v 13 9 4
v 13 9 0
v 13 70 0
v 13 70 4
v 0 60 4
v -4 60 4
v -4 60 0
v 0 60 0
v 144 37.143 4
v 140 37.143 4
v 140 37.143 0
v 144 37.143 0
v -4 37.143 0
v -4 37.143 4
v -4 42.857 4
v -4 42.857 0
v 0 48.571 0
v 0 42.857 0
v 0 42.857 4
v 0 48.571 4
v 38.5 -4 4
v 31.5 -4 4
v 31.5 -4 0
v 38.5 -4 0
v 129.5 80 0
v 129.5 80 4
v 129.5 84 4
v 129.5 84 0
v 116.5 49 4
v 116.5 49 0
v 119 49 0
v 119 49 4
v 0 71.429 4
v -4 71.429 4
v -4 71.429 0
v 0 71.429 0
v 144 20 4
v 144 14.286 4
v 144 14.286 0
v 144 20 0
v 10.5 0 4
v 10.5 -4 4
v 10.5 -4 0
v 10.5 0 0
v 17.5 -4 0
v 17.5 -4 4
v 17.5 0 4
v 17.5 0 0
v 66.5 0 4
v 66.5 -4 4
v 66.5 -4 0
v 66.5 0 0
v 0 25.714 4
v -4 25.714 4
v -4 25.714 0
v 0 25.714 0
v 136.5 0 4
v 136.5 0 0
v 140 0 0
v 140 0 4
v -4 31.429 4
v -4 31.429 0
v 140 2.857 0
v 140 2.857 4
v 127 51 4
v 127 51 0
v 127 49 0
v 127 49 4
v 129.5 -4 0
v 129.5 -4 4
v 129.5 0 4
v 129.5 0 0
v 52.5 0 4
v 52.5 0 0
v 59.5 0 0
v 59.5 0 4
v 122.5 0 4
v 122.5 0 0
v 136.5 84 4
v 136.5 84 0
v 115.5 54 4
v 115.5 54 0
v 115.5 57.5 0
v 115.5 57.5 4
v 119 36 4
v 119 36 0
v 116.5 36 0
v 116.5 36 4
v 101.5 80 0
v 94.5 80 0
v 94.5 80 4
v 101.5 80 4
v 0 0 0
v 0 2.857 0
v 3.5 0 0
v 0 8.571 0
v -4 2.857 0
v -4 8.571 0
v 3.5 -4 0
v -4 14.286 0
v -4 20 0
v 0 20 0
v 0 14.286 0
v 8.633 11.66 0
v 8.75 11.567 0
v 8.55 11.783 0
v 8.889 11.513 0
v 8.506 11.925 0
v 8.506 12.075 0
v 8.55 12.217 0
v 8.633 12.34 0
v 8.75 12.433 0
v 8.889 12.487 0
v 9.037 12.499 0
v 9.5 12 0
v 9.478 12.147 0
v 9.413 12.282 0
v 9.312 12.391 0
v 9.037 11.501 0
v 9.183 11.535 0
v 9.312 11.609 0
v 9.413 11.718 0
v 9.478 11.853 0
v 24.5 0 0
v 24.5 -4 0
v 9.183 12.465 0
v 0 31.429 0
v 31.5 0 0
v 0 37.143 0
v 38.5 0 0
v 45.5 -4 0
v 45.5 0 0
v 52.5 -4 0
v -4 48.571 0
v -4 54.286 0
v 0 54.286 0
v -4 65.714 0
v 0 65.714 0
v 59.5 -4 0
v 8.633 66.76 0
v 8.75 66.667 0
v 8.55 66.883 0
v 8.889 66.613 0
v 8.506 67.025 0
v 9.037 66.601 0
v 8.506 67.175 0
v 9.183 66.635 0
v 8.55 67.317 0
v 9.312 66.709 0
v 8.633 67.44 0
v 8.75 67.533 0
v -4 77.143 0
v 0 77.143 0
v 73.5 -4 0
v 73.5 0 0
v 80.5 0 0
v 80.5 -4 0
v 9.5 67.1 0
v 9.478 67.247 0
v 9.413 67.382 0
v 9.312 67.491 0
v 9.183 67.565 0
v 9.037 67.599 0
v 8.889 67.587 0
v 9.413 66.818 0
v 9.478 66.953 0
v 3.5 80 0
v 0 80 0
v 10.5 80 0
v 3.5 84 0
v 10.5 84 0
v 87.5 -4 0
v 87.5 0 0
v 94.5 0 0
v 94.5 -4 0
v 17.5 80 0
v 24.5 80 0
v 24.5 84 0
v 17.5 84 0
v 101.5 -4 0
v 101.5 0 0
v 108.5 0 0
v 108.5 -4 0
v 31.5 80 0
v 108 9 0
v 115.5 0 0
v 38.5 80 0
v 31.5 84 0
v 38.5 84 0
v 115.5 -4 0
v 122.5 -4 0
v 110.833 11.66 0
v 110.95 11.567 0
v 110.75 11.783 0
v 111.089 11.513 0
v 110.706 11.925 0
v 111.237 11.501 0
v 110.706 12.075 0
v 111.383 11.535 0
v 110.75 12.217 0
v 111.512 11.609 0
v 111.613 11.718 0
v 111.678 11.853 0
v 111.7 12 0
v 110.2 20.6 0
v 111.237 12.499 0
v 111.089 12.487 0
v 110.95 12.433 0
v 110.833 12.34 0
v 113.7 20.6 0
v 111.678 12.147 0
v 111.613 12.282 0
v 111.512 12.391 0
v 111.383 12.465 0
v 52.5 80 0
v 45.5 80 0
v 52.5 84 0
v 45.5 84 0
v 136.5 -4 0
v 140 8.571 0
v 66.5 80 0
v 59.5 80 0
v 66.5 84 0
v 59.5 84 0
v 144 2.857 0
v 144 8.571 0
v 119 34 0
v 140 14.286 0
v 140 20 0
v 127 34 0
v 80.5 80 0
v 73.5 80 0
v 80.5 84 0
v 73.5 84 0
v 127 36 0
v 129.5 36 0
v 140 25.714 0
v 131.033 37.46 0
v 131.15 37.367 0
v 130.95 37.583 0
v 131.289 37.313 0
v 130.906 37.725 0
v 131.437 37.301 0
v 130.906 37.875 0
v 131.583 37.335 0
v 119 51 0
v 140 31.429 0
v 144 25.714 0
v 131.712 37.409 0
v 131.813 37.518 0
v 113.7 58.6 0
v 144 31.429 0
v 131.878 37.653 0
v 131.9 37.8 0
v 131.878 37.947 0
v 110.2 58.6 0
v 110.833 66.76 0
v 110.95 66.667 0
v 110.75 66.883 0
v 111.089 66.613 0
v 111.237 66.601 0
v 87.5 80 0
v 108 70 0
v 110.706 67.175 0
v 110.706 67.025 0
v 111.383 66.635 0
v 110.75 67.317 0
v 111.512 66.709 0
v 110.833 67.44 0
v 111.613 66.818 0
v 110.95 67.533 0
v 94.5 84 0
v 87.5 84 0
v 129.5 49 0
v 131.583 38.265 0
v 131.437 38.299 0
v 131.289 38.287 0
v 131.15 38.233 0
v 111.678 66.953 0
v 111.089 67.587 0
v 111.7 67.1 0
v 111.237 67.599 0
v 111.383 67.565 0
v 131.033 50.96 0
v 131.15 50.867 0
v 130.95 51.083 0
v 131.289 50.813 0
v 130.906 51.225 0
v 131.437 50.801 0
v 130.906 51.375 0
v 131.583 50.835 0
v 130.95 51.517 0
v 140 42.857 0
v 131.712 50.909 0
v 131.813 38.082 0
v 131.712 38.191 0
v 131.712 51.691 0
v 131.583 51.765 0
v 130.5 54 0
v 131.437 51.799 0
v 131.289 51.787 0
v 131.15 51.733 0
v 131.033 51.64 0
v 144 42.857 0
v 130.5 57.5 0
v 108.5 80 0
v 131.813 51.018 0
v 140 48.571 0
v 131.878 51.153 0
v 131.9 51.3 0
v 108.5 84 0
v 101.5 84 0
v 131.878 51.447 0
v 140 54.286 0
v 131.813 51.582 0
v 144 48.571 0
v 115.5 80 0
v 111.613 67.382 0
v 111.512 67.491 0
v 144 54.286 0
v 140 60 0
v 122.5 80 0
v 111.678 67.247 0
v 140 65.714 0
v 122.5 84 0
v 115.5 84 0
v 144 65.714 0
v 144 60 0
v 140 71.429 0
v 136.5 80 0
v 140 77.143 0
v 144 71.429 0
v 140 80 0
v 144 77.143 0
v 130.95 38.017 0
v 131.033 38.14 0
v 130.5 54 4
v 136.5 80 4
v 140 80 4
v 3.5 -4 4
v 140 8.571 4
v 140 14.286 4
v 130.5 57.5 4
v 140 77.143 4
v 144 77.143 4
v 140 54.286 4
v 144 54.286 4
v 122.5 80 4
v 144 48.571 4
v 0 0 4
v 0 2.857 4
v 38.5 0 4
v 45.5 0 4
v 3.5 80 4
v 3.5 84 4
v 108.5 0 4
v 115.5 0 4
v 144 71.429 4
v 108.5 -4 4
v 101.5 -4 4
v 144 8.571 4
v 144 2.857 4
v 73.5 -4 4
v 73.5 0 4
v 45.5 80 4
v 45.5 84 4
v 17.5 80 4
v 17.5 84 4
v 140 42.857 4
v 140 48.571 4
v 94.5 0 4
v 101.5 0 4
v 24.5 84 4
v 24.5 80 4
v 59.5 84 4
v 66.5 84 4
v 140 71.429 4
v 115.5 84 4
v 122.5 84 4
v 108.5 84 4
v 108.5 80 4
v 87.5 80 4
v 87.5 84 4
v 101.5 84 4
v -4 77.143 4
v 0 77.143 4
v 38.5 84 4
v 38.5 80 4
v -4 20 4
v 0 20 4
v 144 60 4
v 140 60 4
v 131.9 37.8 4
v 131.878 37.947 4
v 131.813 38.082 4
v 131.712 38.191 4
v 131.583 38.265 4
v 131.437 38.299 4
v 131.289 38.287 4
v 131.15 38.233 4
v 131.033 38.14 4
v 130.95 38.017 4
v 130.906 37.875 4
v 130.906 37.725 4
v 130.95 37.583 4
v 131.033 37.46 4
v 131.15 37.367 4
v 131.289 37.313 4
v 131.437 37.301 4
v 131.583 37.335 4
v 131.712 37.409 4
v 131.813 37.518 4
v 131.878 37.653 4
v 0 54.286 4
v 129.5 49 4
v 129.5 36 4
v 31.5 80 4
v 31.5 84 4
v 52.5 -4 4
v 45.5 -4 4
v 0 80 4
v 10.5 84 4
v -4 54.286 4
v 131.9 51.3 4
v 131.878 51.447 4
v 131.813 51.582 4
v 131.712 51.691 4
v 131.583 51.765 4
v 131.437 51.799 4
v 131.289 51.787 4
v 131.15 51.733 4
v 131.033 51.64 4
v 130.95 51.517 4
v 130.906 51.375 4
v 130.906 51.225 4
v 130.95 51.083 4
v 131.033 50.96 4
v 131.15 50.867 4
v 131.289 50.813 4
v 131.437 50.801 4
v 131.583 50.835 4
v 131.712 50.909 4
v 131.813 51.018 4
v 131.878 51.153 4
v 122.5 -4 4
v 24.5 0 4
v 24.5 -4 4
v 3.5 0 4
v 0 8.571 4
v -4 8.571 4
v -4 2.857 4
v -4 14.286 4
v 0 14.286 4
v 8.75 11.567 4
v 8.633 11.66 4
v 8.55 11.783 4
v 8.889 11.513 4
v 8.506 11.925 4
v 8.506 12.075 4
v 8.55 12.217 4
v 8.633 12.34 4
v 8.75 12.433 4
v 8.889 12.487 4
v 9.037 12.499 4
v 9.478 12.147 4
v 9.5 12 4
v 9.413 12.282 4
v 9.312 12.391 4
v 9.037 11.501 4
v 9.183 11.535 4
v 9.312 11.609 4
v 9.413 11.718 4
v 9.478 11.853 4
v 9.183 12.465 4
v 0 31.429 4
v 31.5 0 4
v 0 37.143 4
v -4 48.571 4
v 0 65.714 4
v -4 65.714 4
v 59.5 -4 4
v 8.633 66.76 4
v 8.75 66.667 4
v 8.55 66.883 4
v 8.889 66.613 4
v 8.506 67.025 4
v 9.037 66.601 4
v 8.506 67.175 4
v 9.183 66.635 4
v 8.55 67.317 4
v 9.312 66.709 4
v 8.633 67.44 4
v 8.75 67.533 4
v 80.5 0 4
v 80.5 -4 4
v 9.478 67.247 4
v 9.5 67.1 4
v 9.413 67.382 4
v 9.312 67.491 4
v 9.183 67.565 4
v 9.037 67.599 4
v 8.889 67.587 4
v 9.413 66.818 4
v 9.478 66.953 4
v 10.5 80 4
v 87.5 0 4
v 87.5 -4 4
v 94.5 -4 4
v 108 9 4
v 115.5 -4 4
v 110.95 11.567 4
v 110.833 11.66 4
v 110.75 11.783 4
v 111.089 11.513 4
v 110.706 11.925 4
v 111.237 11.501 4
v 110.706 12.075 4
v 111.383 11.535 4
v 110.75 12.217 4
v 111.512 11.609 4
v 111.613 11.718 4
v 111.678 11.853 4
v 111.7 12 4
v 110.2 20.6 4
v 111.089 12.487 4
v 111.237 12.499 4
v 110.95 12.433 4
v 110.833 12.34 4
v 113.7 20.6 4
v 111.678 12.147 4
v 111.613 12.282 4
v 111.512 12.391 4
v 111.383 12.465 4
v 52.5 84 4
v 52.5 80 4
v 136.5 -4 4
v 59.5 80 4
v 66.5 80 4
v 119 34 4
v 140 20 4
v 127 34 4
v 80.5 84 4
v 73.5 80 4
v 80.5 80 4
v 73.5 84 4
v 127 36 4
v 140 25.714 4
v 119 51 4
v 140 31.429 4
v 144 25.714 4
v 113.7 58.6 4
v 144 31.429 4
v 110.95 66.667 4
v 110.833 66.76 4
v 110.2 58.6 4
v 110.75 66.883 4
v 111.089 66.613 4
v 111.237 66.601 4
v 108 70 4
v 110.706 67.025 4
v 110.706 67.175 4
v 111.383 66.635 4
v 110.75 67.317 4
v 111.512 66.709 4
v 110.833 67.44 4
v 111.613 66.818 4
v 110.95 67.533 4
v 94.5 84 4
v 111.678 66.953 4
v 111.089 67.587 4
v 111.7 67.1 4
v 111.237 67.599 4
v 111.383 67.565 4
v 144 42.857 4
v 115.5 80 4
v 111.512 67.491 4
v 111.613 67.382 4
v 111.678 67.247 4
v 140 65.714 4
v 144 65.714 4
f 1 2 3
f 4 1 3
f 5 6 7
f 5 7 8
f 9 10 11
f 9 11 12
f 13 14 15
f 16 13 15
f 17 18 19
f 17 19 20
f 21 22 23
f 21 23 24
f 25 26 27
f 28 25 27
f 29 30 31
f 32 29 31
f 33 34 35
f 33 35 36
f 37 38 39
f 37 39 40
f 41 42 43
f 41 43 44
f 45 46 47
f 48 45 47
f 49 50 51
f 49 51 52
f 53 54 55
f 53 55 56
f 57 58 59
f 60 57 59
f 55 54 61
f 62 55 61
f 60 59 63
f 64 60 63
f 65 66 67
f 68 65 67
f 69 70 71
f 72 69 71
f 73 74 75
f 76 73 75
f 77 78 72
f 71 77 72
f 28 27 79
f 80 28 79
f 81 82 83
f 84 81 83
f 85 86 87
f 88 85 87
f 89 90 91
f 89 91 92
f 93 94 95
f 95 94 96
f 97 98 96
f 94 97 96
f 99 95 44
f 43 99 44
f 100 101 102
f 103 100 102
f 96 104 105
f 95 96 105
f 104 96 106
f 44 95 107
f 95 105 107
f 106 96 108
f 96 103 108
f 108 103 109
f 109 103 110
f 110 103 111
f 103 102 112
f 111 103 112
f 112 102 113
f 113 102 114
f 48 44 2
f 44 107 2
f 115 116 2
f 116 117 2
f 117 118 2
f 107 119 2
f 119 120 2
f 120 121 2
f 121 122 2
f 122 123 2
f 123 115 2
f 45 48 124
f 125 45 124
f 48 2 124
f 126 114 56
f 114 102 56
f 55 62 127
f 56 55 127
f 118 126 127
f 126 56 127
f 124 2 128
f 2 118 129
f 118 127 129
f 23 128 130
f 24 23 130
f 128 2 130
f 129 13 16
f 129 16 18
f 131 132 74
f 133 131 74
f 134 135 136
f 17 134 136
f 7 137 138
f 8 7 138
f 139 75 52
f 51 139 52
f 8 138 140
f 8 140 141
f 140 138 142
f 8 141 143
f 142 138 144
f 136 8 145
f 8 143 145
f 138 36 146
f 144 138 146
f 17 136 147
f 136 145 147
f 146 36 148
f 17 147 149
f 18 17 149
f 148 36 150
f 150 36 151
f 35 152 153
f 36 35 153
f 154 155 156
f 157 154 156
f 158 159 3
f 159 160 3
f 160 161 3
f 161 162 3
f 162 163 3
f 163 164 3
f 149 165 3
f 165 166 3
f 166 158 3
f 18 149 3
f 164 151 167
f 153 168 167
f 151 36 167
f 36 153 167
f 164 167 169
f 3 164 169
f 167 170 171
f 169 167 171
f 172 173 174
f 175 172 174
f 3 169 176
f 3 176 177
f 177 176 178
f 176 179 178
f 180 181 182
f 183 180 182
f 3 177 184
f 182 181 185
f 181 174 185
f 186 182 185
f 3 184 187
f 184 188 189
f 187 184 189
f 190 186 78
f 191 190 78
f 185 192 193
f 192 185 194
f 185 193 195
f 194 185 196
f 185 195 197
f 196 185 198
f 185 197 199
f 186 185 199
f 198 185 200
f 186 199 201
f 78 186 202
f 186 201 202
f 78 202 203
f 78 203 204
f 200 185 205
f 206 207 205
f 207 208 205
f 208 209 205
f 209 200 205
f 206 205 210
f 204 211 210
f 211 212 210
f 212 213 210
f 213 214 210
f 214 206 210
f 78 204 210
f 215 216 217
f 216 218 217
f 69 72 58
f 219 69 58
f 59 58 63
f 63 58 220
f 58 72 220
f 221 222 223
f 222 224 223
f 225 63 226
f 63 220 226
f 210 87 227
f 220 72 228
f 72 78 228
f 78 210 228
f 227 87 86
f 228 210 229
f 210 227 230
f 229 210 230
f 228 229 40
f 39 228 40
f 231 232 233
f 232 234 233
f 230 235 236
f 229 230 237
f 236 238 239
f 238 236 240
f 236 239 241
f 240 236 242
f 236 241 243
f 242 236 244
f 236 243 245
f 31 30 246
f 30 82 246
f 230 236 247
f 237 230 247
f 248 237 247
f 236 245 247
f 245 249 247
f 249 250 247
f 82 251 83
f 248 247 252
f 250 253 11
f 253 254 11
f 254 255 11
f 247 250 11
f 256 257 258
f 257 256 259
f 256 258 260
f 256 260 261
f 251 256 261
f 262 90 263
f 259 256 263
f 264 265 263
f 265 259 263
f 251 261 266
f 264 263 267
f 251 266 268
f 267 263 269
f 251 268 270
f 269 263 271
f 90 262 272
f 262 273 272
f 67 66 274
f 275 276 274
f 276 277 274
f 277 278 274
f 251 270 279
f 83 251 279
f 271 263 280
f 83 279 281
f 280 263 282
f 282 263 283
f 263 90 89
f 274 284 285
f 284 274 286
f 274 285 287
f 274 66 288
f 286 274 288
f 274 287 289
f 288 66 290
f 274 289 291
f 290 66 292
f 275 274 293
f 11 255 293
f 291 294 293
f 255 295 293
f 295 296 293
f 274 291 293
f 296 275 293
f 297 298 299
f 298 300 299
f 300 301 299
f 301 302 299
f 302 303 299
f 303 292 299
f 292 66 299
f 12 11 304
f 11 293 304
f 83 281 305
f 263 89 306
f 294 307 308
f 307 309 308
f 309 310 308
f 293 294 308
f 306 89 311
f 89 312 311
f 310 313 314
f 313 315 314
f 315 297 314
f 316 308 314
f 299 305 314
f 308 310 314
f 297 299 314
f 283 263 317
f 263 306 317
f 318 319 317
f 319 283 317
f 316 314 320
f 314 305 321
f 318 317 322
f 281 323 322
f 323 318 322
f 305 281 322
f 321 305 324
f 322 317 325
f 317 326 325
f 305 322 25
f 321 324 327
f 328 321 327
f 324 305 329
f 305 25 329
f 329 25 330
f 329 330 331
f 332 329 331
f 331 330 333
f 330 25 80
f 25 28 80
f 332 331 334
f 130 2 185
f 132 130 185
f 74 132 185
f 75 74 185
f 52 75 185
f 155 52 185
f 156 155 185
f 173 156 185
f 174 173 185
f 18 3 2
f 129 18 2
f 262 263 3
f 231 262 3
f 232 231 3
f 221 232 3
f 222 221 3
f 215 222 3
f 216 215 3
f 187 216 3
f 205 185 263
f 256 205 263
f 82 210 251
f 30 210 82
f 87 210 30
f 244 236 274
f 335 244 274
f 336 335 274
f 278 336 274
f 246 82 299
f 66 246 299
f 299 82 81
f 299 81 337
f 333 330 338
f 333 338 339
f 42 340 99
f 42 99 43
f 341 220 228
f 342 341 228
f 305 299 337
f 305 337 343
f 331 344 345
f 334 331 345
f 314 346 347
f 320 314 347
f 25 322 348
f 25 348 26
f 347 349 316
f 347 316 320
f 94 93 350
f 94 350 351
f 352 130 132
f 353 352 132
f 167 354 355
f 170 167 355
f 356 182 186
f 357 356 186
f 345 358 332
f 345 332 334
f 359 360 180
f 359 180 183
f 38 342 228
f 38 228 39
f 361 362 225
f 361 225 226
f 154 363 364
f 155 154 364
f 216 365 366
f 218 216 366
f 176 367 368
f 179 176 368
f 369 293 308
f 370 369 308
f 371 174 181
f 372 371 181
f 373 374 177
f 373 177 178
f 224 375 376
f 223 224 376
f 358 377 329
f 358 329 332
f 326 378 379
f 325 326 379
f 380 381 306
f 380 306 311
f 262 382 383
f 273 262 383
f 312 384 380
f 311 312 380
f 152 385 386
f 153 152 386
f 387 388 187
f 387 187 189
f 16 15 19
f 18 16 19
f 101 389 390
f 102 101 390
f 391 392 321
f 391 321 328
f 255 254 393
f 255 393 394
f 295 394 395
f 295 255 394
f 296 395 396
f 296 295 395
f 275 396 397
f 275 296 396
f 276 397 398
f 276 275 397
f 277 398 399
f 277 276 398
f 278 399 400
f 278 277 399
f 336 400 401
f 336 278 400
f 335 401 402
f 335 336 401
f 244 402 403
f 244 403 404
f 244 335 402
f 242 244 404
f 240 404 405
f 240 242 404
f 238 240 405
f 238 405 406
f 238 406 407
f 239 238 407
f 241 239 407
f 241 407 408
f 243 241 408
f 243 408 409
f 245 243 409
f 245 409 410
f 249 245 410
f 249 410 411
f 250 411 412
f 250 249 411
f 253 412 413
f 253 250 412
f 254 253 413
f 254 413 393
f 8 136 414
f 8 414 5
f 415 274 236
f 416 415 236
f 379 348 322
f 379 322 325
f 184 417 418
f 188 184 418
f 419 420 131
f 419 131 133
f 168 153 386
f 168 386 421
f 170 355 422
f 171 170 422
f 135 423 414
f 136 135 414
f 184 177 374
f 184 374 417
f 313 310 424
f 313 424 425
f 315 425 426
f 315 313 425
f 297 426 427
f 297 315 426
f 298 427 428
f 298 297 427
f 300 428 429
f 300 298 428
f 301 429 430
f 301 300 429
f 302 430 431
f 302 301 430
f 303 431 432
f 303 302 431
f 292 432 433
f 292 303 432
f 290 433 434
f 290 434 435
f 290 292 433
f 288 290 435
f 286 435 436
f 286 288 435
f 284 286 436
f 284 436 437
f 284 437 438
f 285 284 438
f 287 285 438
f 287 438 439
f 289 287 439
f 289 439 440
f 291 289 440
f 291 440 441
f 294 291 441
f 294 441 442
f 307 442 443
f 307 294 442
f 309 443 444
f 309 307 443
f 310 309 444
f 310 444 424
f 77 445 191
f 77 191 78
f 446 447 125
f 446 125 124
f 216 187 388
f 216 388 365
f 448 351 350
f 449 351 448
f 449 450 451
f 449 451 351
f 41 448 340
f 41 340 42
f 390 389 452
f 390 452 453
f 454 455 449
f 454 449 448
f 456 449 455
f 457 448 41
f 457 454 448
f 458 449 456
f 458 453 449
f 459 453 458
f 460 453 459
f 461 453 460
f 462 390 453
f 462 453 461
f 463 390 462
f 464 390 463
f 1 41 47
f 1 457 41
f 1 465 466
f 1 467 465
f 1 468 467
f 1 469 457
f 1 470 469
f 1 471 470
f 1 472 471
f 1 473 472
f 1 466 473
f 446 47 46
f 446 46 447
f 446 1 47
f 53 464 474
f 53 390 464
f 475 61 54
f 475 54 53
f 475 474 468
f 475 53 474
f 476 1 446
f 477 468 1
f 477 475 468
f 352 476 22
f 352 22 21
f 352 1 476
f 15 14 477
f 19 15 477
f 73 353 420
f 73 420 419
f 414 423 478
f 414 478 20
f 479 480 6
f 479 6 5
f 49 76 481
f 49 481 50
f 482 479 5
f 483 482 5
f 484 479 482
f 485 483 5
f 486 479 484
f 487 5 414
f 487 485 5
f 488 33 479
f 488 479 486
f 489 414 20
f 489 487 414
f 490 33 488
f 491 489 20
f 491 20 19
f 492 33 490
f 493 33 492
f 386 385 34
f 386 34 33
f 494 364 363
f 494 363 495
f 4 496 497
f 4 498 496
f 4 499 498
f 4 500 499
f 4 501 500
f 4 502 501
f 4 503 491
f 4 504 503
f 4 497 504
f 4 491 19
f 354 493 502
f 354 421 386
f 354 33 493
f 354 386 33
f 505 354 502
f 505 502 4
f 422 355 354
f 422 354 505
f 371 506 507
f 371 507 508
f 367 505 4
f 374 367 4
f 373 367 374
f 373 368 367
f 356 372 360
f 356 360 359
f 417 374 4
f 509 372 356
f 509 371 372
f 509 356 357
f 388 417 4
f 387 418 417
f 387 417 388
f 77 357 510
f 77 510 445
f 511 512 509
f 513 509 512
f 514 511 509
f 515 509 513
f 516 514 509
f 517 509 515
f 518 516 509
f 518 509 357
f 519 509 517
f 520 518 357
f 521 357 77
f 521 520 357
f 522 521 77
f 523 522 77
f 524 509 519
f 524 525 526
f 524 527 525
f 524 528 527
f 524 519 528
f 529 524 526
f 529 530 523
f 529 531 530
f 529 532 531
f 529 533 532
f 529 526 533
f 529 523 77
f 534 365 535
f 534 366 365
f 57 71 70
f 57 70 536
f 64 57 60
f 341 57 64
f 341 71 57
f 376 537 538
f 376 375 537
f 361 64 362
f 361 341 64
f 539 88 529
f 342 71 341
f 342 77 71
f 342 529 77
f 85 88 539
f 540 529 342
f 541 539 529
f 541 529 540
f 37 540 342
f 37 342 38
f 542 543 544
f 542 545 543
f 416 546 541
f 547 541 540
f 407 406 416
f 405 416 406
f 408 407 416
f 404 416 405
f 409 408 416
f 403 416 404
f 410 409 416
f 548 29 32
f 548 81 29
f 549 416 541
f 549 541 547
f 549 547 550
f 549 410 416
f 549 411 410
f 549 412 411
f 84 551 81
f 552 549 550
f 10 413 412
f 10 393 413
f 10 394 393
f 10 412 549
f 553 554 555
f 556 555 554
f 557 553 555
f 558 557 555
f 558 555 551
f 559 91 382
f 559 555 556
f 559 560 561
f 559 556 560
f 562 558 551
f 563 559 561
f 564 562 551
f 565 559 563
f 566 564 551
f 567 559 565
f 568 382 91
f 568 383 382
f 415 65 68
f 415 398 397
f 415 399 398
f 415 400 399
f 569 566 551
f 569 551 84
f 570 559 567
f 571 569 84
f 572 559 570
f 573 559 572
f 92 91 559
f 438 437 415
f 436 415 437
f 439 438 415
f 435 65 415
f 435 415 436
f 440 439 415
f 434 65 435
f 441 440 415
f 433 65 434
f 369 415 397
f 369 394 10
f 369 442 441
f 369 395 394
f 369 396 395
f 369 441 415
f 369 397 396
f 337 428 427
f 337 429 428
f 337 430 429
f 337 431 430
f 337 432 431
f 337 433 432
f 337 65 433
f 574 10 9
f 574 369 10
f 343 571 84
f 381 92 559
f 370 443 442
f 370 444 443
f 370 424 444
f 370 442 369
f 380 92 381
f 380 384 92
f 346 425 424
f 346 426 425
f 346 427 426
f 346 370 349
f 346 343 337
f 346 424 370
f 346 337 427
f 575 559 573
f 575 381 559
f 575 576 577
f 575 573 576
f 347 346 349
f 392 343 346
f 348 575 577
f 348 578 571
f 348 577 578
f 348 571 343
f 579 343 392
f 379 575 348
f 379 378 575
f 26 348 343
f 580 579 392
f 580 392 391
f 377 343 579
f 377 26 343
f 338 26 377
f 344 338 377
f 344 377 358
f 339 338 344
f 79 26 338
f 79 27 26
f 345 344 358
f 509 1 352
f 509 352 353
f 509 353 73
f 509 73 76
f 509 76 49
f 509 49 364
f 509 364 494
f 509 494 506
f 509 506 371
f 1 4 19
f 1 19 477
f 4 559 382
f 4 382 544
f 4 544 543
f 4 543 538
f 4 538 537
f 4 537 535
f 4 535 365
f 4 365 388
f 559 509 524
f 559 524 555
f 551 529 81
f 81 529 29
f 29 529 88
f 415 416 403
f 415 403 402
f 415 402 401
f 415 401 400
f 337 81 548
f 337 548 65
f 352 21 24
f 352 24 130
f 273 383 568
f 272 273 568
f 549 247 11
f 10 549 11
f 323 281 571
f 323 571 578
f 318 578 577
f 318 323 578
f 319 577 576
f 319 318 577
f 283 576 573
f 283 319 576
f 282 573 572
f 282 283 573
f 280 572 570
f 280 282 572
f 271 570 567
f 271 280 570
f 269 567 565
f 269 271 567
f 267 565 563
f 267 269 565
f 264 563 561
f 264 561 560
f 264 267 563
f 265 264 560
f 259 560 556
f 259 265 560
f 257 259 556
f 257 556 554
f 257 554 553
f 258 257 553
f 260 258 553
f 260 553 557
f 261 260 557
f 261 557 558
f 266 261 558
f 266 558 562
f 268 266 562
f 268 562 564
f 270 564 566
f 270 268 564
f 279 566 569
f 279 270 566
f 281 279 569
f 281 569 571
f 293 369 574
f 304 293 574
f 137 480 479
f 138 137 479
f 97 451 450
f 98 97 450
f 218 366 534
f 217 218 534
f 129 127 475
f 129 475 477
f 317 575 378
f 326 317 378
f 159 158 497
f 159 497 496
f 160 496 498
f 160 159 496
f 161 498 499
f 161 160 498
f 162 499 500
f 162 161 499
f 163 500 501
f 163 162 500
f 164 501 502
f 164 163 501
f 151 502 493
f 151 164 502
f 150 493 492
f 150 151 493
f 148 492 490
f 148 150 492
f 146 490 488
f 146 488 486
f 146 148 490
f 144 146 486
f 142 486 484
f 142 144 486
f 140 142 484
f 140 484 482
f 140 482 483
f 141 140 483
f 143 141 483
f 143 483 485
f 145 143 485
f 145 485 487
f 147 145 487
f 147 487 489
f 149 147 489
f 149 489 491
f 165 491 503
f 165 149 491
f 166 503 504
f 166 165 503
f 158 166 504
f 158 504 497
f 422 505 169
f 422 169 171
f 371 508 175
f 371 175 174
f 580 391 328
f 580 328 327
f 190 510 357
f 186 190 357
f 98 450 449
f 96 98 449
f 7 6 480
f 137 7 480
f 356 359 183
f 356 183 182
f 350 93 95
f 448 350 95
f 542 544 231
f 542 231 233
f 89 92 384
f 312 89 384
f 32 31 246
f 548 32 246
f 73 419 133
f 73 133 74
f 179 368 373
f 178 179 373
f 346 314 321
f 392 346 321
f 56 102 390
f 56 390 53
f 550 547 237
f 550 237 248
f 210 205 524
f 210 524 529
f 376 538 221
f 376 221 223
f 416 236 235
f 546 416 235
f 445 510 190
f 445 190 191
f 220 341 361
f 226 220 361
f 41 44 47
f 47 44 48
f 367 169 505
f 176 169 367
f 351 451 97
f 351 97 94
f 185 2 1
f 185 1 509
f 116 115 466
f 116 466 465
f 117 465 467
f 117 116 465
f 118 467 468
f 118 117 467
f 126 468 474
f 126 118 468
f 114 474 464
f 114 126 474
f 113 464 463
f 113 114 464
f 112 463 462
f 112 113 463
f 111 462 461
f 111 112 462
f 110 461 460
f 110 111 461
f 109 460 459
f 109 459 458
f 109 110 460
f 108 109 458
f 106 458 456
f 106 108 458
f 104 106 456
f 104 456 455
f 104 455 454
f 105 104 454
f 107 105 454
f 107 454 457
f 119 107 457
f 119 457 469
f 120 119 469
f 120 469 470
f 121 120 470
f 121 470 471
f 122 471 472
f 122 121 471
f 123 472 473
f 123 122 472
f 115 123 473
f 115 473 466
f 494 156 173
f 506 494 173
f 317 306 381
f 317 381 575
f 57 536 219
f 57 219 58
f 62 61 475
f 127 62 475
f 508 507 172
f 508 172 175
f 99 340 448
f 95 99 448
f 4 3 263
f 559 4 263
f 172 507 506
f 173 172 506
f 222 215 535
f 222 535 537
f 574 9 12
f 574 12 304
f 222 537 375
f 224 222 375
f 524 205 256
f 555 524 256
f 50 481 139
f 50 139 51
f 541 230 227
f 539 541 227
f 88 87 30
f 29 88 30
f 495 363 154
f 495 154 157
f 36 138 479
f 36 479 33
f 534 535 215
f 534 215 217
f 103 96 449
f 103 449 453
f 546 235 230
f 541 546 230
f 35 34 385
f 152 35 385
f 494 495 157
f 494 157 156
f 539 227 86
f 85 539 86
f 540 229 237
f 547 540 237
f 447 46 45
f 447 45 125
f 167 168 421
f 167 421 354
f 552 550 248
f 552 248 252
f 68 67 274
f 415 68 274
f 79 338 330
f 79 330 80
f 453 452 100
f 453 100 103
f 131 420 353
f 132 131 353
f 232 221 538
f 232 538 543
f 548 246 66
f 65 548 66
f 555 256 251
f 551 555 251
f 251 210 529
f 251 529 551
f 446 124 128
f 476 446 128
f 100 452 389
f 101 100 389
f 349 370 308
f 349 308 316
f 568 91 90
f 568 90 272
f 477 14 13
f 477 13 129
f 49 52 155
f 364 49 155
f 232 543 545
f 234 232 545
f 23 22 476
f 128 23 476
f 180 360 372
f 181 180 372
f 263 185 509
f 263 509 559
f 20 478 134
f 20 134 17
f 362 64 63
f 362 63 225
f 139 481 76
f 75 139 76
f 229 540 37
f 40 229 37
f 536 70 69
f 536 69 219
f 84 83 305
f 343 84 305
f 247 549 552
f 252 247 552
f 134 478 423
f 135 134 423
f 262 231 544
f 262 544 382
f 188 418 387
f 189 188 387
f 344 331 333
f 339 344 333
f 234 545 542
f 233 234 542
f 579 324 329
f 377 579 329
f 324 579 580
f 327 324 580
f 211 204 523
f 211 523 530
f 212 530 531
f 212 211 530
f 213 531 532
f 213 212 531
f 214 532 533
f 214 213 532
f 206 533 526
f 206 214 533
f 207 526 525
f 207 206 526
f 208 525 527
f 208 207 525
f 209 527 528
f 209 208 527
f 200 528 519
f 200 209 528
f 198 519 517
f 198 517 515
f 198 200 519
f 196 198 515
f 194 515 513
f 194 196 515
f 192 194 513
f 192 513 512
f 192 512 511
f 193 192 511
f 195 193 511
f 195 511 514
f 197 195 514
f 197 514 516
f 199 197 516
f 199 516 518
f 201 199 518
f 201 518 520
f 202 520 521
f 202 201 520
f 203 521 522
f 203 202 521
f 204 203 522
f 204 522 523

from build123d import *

# Parameters (mm, degrees)
SCHIZZO1_W                   = 140
SCHIZZO1_H                   = 80
SCHIZZO1_R                   = 0.5
SCHIZZO1_W_2                 = 95
SCHIZZO1_H_2                 = 61
SCHIZZO1_W_3                 = 3.5
SCHIZZO1_H_3                 = 38
SCHIZZO1_W_4                 = 15
SCHIZZO1_H_4                 = 3.5
ESTRUSIONE_ESTRUSIONE1_DEPTH = 4
SCHIZZO2_W                   = 7
SCHIZZO2_H                   = 4
ESTRUSIONE_ESTRUSIONE2_DEPTH = 4
RIPETIZIONE_A_L1_COUNT       = 10
RIPETIZIONE_A_L1_PITCH       = 14
SCHIZZO3_W                   = 4
SCHIZZO3_H                   = 5.714285714
ESTRUSIONE_ESTRUSIONE3_DEPTH = 4
RIPETIZIONE_A_L2_COUNT       = 7
RIPETIZIONE_A_L2_PITCH       = 11.428571429


with BuildPart() as part:
    # Schizzo1 → Estrusione-Estrusione1 (new body)
    with BuildSketch(Plane.XY):
        with Locations((70, 40)):
            Rectangle(SCHIZZO1_W, SCHIZZO1_H)
        with Locations((9, 12)):
            Circle(SCHIZZO1_R, mode=Mode.SUBTRACT)
        with Locations((60.5, 39.5)):
            Rectangle(SCHIZZO1_W_2, SCHIZZO1_H_2, mode=Mode.SUBTRACT)
        with Locations((111.2, 12)):
            Circle(SCHIZZO1_R, mode=Mode.SUBTRACT)
        with Locations((111.95, 39.6)):
            Rectangle(SCHIZZO1_W_3, SCHIZZO1_H_3, mode=Mode.SUBTRACT)
        with Locations((131.4, 37.8)):
            Circle(SCHIZZO1_R, mode=Mode.SUBTRACT)
        with Locations((9, 67.1)):
            Circle(SCHIZZO1_R, mode=Mode.SUBTRACT)
        Polygon((119, 36), (116.5, 36), (116.5, 49), (119, 49), (119, 51), (127, 51), (127, 49), (129.5, 49), (129.5, 36), (127, 36), (127, 34), (119, 34), align=None, mode=Mode.SUBTRACT)
        with Locations((131.4, 51.3)):
            Circle(SCHIZZO1_R, mode=Mode.SUBTRACT)
        with Locations((123, 55.75)):
            Rectangle(SCHIZZO1_W_4, SCHIZZO1_H_4, mode=Mode.SUBTRACT)
        with Locations((111.2, 67.1)):
            Circle(SCHIZZO1_R, mode=Mode.SUBTRACT)
    extrude(amount=ESTRUSIONE_ESTRUSIONE1_DEPTH)

    # Schizzo2 → Estrusione-Estrusione2 (add)
    with BuildSketch(Plane.XY.offset(4)):
        with Locations((7, 82)):
            Rectangle(SCHIZZO2_W, SCHIZZO2_H)
        with Locations((7, -2)):
            Rectangle(SCHIZZO2_W, SCHIZZO2_H)
    estrusione_estrusione2 = extrude(amount=-ESTRUSIONE_ESTRUSIONE2_DEPTH)

    # Ripetizione a L1: Estrusione-Estrusione2 ×10
    with Locations(*[(i * RIPETIZIONE_A_L1_PITCH, 0, 0) for i in range(1, RIPETIZIONE_A_L1_COUNT)]):
        add(estrusione_estrusione2)

    # Schizzo3 → Estrusione-Estrusione3 (add)
    with BuildSketch(Plane.XY.offset(4)):
        with Locations((-2, 74.285714286)):
            Rectangle(SCHIZZO3_W, SCHIZZO3_H)
        with Locations((142, 74.285714286)):
            Rectangle(SCHIZZO3_W, SCHIZZO3_H)
    estrusione_estrusione3 = extrude(amount=-ESTRUSIONE_ESTRUSIONE3_DEPTH)

    # Ripetizione a L2: Estrusione-Estrusione3 ×7
    with Locations(*[(0, -i * RIPETIZIONE_A_L2_PITCH, 0) for i in range(1, RIPETIZIONE_A_L2_COUNT)]):
        add(estrusione_estrusione3)


solid = part.part
